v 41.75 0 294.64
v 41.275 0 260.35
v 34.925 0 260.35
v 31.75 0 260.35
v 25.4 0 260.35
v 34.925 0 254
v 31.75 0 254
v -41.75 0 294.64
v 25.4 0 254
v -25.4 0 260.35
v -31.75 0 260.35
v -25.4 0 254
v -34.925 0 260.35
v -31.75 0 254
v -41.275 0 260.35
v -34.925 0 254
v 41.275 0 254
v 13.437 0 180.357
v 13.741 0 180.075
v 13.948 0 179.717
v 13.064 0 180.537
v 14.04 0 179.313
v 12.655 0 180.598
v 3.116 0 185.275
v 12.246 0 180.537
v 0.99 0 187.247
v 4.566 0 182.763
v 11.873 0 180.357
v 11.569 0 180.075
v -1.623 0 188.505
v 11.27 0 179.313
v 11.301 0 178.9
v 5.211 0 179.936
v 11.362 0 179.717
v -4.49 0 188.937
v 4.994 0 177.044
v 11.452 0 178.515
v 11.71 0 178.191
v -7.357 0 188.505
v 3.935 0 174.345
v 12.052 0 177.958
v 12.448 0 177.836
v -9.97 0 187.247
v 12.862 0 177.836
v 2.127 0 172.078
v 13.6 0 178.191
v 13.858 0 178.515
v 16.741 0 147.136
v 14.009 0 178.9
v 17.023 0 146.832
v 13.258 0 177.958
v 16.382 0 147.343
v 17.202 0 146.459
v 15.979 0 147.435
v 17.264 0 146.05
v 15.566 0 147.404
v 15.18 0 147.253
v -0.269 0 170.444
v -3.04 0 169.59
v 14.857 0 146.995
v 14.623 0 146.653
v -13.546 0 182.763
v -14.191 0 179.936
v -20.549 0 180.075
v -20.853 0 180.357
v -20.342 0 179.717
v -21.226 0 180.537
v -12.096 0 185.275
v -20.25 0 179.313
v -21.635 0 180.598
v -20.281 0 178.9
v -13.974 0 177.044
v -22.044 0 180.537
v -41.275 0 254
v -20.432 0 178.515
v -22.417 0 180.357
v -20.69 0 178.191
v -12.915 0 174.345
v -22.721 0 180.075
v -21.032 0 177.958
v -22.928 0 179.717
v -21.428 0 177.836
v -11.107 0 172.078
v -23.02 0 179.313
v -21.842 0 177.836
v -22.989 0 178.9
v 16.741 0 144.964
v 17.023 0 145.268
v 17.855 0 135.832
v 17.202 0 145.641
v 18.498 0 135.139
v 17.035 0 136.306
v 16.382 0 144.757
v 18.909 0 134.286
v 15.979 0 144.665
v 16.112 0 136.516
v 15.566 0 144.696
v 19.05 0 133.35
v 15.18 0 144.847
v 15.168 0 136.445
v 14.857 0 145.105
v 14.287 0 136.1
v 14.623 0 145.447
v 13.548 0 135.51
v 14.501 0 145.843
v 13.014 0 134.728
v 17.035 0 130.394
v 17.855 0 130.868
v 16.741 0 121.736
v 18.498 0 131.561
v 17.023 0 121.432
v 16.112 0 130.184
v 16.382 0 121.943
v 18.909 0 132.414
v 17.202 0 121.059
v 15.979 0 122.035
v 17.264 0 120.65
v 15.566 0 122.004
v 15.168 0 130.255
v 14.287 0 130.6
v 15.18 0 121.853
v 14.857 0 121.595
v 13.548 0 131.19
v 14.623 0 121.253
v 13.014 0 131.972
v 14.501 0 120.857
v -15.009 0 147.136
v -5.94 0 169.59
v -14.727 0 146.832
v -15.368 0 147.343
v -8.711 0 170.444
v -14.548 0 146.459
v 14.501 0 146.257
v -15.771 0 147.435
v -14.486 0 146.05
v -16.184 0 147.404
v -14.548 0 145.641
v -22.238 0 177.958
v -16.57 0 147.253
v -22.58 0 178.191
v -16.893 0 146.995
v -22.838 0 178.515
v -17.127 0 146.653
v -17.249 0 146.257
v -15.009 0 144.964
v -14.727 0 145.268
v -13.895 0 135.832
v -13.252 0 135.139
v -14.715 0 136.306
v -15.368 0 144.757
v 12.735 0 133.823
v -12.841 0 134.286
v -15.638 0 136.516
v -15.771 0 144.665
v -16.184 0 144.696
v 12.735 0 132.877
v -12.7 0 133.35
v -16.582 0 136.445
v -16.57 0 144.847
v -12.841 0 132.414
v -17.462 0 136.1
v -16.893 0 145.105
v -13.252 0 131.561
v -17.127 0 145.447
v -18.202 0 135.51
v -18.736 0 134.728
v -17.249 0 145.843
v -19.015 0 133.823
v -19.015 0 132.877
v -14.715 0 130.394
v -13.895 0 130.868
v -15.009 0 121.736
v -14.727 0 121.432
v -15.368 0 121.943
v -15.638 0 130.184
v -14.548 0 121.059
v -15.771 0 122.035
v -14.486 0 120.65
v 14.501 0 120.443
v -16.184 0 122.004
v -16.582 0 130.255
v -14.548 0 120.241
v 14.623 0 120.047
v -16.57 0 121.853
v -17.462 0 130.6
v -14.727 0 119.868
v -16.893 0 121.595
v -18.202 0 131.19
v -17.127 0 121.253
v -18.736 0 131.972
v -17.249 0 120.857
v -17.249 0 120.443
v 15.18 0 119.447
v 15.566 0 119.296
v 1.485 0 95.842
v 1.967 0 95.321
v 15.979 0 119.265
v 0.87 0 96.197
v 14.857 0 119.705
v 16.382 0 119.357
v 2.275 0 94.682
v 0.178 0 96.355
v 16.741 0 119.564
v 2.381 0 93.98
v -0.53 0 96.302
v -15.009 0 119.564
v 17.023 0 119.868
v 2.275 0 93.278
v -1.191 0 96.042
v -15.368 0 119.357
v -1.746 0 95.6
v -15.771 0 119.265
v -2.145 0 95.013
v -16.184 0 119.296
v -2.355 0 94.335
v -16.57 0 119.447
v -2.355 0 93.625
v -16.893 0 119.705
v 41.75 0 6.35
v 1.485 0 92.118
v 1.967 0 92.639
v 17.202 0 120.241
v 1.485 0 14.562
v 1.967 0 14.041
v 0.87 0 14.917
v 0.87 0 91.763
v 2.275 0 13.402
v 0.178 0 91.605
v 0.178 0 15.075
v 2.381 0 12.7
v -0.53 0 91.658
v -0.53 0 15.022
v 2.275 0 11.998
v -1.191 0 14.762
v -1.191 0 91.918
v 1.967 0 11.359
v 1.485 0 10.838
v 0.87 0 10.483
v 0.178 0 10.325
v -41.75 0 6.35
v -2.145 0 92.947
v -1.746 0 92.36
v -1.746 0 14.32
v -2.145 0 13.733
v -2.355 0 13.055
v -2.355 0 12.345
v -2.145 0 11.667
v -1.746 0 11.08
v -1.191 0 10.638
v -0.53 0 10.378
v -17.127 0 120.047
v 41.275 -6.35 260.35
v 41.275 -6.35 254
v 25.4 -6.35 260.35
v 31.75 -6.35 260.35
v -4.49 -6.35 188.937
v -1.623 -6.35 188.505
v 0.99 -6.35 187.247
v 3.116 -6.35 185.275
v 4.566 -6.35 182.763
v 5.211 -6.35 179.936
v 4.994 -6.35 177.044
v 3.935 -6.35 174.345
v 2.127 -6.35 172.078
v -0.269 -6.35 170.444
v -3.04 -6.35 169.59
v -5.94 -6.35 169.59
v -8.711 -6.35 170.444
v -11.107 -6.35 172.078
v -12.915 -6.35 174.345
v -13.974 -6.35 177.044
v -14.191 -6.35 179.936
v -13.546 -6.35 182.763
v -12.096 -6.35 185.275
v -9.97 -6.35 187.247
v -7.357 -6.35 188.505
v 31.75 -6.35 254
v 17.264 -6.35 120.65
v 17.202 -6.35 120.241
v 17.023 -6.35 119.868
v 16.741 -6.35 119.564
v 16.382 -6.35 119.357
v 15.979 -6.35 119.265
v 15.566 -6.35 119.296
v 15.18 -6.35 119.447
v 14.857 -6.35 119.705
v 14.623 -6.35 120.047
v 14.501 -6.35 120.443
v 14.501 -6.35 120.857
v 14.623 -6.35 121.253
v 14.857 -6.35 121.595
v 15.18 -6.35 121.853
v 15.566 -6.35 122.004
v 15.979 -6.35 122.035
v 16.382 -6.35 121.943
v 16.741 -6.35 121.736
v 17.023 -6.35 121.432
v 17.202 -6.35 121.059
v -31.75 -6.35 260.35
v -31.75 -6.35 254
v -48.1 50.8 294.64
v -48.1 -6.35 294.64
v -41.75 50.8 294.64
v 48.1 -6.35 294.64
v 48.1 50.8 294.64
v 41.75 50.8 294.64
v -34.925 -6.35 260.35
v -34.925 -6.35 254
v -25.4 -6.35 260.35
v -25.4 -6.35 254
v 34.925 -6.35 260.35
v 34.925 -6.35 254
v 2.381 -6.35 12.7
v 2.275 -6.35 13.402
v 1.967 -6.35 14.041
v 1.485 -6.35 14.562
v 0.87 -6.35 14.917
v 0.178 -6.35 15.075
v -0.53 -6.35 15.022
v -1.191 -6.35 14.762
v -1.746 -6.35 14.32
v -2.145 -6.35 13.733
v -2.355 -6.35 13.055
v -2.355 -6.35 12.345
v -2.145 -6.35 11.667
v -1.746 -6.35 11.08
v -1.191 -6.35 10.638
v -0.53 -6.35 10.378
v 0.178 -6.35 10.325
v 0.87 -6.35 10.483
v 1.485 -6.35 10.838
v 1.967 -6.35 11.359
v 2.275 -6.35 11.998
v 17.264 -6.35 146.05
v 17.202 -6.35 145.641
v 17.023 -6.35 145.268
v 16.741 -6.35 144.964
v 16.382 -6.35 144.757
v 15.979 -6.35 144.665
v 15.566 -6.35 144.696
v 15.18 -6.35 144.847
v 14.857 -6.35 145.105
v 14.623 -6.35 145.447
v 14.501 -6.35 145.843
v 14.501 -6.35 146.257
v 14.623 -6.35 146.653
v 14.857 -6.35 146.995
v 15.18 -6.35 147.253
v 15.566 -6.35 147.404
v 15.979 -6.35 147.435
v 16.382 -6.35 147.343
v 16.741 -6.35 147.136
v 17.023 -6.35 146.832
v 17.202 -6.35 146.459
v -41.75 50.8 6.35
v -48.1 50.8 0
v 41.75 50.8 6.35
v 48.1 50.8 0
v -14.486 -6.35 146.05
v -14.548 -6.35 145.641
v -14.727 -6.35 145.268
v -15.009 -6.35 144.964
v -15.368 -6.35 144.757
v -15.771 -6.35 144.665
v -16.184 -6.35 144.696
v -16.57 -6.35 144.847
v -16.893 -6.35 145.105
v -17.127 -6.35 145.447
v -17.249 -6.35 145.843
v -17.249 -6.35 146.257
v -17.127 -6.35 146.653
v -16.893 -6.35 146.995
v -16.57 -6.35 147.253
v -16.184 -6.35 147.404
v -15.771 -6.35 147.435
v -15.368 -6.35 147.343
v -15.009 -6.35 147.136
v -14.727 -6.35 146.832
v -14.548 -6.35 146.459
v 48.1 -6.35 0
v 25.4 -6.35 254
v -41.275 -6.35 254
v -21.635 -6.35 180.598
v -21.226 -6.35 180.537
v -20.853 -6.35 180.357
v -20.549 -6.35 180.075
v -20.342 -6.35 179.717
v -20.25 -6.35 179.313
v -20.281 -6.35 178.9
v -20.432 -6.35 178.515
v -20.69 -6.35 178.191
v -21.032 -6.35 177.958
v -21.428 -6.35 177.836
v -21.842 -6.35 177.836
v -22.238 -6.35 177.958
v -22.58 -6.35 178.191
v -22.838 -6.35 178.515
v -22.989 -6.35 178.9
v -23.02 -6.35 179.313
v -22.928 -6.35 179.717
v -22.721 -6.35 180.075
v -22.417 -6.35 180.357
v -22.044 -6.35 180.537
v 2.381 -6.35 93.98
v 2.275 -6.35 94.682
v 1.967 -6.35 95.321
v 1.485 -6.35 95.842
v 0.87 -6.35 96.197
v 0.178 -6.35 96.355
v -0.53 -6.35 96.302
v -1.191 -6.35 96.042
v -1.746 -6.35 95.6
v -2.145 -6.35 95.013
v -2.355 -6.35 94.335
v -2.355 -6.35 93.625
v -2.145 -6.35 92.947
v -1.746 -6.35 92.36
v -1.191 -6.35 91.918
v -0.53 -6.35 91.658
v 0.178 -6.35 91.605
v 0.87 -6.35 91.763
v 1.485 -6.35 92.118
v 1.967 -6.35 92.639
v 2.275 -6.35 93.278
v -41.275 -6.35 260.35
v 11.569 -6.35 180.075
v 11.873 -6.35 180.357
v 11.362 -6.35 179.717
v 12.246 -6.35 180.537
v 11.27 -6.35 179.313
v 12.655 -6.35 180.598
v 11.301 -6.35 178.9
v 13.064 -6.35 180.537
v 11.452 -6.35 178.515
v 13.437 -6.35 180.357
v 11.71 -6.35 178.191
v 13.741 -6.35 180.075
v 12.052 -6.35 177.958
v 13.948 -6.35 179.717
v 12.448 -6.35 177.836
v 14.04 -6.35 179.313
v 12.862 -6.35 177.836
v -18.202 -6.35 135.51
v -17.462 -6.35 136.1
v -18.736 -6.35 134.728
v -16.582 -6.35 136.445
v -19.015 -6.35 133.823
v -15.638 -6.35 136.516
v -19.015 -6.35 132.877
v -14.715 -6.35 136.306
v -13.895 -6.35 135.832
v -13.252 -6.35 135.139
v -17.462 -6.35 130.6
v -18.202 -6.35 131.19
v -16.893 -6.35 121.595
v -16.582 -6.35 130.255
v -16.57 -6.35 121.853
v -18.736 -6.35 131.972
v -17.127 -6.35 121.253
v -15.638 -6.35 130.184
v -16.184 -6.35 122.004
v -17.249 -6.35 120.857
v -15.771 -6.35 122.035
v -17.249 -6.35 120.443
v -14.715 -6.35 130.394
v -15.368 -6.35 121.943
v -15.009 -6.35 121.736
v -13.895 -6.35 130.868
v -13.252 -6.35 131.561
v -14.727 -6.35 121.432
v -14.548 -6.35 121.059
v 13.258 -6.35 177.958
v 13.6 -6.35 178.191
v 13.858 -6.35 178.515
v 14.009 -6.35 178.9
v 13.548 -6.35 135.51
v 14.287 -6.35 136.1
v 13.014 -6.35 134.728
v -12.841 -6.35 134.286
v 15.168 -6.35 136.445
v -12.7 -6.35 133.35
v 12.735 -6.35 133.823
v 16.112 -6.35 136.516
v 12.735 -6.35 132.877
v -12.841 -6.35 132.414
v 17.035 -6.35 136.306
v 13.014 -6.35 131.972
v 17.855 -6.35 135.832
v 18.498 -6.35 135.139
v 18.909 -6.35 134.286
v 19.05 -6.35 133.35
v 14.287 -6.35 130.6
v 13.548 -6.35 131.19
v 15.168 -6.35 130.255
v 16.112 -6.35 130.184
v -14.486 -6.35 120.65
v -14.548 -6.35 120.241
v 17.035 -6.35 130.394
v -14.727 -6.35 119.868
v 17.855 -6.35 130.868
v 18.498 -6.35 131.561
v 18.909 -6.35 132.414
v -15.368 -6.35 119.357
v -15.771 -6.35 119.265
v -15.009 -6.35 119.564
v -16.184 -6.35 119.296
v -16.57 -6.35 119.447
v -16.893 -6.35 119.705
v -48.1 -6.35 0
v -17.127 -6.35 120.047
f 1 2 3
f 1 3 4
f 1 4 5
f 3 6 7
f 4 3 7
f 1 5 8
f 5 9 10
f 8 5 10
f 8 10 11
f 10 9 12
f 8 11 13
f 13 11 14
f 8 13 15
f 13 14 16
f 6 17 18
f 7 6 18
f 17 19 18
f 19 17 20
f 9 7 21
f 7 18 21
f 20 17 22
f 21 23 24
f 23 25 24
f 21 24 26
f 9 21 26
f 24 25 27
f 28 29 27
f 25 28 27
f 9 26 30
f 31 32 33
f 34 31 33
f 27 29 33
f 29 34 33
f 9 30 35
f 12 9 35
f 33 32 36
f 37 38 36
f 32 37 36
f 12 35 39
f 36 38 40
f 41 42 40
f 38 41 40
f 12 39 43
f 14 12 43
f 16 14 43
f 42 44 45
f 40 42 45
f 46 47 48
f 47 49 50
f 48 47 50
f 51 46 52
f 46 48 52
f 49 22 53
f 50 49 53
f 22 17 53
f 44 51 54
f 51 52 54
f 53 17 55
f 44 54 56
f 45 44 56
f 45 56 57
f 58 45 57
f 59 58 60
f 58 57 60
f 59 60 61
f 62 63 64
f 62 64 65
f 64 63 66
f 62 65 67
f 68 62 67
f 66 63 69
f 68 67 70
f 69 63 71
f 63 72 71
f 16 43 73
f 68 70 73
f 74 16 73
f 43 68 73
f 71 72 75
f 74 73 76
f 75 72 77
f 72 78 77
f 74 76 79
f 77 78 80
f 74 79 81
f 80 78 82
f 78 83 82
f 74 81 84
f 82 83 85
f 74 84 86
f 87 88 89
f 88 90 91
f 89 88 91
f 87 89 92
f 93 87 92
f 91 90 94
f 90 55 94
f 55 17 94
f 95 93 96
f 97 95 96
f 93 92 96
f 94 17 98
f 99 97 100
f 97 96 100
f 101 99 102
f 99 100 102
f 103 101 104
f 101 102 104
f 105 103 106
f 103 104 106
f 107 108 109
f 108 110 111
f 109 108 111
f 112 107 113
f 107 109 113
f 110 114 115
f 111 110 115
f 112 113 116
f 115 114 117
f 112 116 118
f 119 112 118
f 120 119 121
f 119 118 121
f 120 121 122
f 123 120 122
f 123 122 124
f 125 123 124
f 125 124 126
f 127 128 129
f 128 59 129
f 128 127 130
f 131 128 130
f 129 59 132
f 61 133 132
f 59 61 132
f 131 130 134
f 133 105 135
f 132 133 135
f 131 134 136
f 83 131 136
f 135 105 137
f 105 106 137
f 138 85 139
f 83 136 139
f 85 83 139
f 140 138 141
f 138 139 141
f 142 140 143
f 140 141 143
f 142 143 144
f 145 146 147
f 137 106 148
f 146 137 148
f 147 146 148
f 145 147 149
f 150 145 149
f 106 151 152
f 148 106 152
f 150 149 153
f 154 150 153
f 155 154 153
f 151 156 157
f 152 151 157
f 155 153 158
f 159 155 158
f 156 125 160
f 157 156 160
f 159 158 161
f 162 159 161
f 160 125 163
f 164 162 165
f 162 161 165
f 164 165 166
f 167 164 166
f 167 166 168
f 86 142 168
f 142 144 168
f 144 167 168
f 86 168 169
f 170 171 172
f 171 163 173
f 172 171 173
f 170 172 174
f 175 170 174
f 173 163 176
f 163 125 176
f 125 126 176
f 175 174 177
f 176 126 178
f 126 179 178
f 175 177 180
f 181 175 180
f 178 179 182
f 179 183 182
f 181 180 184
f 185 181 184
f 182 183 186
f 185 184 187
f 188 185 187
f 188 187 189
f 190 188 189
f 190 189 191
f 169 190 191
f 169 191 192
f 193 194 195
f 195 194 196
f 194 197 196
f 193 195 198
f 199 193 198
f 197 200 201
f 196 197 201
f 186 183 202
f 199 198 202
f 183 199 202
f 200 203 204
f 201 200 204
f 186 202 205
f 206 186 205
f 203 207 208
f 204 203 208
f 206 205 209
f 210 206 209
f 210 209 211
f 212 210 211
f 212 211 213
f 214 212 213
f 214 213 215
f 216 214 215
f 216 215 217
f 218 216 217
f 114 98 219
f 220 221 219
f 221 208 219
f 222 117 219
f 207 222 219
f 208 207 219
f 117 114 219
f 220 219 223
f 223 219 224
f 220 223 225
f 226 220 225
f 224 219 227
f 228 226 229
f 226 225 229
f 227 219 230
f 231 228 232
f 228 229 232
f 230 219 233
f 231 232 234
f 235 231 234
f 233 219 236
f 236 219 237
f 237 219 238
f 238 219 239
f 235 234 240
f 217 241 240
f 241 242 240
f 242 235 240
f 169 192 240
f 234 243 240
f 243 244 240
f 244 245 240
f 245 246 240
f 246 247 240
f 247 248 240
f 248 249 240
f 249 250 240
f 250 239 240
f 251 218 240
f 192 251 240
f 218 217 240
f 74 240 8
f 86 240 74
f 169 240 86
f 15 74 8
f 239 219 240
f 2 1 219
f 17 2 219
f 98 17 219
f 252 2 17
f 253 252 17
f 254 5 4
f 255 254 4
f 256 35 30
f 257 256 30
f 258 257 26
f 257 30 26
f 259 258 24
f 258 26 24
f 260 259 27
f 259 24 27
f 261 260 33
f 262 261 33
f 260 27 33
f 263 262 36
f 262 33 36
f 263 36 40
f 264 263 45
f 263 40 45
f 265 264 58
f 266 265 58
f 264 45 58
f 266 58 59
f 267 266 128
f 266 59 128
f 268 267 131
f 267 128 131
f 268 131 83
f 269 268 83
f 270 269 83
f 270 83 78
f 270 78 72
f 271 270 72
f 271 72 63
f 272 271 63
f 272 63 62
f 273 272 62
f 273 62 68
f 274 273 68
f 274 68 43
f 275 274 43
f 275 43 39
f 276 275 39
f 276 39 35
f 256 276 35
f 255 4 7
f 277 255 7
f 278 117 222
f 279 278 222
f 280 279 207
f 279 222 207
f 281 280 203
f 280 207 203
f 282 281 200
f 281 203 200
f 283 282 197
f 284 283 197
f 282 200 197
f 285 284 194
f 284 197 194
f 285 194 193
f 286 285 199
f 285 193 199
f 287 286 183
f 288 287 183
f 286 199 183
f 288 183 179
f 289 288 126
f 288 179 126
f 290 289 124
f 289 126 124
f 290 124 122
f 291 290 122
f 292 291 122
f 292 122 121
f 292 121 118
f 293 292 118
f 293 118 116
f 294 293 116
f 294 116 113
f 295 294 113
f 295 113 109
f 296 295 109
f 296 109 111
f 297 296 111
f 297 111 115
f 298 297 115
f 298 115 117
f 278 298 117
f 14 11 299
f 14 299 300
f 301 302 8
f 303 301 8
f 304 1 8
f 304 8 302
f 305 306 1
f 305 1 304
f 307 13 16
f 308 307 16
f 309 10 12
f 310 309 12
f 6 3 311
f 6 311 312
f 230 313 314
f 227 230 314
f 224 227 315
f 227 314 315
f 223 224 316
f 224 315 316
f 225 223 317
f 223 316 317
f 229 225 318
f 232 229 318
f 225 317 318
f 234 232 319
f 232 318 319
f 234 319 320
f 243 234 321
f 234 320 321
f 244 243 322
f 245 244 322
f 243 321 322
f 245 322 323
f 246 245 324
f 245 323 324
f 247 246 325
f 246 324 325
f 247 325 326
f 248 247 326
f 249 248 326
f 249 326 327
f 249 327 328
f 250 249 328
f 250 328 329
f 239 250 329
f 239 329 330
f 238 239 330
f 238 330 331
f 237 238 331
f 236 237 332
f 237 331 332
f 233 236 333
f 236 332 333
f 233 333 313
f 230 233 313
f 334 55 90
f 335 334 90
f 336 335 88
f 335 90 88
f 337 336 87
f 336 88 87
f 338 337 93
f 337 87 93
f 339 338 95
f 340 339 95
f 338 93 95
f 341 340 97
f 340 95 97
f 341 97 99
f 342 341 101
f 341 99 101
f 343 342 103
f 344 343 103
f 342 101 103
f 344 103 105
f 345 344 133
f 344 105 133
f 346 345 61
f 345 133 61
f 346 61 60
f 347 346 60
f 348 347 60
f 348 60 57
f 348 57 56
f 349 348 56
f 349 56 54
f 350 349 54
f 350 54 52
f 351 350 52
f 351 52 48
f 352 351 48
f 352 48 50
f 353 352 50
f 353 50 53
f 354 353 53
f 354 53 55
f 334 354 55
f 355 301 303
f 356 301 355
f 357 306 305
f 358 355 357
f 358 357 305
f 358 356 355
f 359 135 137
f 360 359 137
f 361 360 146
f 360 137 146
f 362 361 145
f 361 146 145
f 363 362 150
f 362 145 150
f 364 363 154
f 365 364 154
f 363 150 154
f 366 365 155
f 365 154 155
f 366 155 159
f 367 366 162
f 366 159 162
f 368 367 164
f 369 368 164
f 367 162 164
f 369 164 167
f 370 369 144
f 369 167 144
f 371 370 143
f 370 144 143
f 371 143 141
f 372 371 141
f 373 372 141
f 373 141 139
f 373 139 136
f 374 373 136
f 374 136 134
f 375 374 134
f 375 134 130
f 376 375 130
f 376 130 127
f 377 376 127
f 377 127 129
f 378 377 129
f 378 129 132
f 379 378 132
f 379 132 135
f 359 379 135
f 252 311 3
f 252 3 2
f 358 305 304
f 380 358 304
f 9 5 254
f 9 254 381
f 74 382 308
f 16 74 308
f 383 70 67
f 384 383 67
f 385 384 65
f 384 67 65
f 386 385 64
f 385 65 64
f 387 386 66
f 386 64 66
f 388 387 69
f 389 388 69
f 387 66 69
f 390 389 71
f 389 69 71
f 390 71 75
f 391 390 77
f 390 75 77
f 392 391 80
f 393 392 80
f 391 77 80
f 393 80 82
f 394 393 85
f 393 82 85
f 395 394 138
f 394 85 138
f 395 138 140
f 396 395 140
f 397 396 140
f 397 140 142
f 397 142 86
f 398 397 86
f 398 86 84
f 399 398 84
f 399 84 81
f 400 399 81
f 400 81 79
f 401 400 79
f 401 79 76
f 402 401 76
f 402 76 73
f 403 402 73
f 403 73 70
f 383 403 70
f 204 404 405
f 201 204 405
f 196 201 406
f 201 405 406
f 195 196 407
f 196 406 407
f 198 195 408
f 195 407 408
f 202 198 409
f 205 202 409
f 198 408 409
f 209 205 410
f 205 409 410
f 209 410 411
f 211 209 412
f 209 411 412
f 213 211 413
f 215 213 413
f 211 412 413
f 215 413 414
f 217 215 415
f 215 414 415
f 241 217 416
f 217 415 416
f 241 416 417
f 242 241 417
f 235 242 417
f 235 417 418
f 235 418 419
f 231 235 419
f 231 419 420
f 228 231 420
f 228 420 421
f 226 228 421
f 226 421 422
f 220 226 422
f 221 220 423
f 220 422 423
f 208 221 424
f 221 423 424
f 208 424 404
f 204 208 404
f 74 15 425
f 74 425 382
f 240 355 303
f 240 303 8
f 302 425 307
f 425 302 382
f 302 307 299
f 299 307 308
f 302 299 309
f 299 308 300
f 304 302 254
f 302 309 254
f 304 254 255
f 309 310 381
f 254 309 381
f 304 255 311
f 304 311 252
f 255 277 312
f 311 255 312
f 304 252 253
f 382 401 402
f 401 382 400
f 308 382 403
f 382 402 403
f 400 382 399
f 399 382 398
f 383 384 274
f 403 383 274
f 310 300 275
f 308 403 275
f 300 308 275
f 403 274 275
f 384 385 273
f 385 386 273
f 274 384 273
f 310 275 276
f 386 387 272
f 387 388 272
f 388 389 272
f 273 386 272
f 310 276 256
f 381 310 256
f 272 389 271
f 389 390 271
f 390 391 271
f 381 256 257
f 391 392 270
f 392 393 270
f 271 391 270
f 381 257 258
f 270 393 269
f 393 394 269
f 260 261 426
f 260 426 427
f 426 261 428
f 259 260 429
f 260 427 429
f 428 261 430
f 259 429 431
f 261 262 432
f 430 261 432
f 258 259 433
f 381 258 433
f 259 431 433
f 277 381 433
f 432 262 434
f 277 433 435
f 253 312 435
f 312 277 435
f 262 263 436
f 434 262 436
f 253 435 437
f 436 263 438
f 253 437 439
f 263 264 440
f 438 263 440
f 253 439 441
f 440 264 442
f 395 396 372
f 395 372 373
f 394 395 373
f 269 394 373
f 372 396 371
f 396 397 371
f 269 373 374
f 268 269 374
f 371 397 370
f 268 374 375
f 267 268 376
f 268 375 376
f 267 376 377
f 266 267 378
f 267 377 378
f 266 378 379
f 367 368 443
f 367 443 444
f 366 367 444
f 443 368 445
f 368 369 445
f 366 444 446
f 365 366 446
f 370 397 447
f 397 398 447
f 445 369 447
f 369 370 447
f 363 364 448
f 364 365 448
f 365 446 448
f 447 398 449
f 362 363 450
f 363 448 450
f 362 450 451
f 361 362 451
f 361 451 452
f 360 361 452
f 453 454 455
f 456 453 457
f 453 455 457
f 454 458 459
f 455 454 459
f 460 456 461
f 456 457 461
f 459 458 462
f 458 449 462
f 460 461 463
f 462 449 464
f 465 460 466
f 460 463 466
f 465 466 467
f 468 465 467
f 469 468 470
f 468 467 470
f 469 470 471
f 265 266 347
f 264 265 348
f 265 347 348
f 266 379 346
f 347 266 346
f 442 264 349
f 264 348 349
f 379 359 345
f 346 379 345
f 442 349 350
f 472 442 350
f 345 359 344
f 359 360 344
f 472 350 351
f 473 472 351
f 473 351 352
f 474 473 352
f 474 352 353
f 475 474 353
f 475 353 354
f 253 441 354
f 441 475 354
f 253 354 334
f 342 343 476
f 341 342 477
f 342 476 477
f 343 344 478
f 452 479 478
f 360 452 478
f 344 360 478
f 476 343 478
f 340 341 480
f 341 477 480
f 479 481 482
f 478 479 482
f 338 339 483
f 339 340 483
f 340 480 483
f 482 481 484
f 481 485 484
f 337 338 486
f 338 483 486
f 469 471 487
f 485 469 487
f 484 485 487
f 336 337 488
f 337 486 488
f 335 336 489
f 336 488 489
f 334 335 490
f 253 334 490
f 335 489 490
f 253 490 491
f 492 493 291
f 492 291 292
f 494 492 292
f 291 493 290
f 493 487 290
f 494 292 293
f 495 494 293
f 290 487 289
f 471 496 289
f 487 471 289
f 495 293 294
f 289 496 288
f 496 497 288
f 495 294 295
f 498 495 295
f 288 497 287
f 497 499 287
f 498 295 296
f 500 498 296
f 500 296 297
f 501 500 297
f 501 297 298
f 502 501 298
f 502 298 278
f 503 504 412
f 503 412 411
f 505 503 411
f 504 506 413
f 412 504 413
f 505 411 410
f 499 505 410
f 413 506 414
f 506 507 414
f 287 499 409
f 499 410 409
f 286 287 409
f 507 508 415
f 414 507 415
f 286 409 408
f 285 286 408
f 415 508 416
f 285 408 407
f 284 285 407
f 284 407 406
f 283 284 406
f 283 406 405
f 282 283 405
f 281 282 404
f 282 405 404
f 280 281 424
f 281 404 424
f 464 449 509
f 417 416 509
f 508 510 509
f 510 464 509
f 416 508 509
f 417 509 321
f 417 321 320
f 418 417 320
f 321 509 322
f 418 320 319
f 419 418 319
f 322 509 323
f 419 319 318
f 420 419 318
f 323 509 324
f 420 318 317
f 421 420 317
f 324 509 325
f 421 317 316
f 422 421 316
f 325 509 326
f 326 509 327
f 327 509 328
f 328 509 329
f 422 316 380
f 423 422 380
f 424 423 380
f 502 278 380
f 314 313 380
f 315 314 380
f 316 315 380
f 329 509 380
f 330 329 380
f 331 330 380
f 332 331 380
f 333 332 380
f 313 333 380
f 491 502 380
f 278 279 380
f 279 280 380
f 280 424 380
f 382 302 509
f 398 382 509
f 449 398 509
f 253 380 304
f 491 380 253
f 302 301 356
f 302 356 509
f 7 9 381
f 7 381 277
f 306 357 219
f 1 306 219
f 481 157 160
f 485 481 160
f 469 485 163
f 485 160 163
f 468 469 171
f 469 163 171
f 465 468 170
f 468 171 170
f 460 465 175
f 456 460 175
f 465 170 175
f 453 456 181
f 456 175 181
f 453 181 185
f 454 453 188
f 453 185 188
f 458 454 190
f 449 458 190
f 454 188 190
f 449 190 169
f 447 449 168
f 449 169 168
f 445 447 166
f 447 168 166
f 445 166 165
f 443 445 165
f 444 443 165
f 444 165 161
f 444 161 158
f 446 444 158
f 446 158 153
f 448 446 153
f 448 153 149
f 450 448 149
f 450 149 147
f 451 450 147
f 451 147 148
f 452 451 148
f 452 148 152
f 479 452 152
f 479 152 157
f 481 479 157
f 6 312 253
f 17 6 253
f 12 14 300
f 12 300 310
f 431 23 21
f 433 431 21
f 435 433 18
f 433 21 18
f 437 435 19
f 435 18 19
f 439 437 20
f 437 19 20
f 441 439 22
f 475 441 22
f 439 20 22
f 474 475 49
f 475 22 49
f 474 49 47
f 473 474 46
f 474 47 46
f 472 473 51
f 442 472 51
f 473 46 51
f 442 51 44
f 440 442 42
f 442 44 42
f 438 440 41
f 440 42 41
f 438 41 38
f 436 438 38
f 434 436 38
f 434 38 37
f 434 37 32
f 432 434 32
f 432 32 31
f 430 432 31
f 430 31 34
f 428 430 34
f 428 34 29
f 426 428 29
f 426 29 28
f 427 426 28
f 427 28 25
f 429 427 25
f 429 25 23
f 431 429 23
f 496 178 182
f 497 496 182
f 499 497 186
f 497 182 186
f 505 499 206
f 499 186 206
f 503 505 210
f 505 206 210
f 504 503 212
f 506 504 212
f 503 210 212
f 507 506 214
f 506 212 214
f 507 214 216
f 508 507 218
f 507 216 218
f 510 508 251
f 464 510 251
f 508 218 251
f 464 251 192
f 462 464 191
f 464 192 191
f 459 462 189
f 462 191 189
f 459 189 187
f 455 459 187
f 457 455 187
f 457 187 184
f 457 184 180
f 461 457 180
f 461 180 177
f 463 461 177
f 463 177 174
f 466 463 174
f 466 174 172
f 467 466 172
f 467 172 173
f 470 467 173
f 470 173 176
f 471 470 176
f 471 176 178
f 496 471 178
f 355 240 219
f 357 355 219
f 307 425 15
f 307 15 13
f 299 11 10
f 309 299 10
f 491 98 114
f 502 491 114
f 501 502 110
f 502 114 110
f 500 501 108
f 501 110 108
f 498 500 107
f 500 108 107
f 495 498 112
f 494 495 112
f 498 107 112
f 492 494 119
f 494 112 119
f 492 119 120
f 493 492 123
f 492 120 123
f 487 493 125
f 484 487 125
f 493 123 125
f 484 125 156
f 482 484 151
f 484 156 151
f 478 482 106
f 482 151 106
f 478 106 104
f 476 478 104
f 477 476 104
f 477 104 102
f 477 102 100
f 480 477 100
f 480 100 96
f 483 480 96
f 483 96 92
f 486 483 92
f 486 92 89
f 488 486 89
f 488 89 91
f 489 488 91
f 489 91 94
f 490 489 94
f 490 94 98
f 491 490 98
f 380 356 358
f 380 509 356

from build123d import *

# Parameters (mm, degrees)
BOSS_EXTRUDE1_DEPTH            = 294.64
SKETCH2_W                      = 83.5
SKETCH2_H                      = 6.35
BOSS_EXTRUDE2_DEPTH            = 50.8
SKETCH3_R                      = 2.38125
CUT_EXTRUDE1_DEPTH             = 6.35
CUT_EXTRUDE2_REACH             = 304.832
SKETCH4_R                      = 9.7282
SKETCH4_R_2                    = 1.3890625
CUT_EXTRUDE3_REACH             = 304.832
SKETCH5_R                      = 3.175
SKETCH5_R_2                    = 1.3890625
CUT_EXTRUDE3_DIRECTION_2_DEPTH = 303.83160271
SKETCH6_W                      = 6.35
SKETCH6_H                      = 6.35
CUT_EXTRUDE4_DEPTH             = 6.35


with BuildPart() as part:
    # Sketch1 → Boss-Extrude1 (new body)
    with BuildSketch(Plane.XY):
        Polygon((0, 0), (41.75, 0), (41.75, 22.225), (41.75, 50.8), (48.1, 50.8), (48.1, -6.35), (0, -6.35), align=None)
    extrude(amount=BOSS_EXTRUDE1_DEPTH)

    # Mirror1: part across plane


with BuildPart() as part_1:
    add(part.part)
    add(part.part.mirror(Plane(origin=(0, -6.35, 294.64), x_dir=(0, 0, 1), z_dir=(-1, 0, 0))))

    # Sketch2 → Boss-Extrude2 (add)
    with BuildSketch(Plane(origin=(0, 0, 0), x_dir=(1, 0, 0), z_dir=(0, 1, 0))):
        with Locations((0, -3.175)):
            Rectangle(SKETCH2_W, SKETCH2_H)
    extrude(amount=BOSS_EXTRUDE2_DEPTH)

    # Sketch3 → Cut-Extrude1 (cut)
    with BuildSketch(Plane.XZ.offset(6.35)):
        with Locations((0, 12.7)):
            Circle(SKETCH3_R)
        with Locations((0, 93.98)):
            Circle(SKETCH3_R)
    extrude(amount=-CUT_EXTRUDE1_DEPTH, mode=Mode.SUBTRACT)

    # Sketch4 → Cut-Extrude2 (cut, up to next)
    with BuildSketch(Plane(origin=(0, 0, 0), x_dir=(1, 0, 0), z_dir=(0, 1, 0)), mode=Mode.PRIVATE) as cut_extrude2_sk1:
        with Locations(Location((-4.490010202, -179.209178053, 0), (0, 0, 270))):
            Circle(SKETCH4_R)
    cut_extrude2_tool1 = extrude(cut_extrude2_sk1.sketch, amount=-CUT_EXTRUDE2_REACH, mode=Mode.PRIVATE) & part_1.part
    # Sketch4 → Cut-Extrude2 (cut, up to next)
    with BuildSketch(Plane(origin=(0, 0, 0), x_dir=(1, 0, 0), z_dir=(0, 1, 0)), mode=Mode.PRIVATE) as cut_extrude2_sk2:
        with Locations(Location((-21.635010202, -179.209178053, 0), (0, 0, 270))):
            Circle(SKETCH4_R_2)
    cut_extrude2_tool2 = extrude(cut_extrude2_sk2.sketch, amount=-CUT_EXTRUDE2_REACH, mode=Mode.PRIVATE) & part_1.part
    # Sketch4 → Cut-Extrude2 (cut, up to next)
    with BuildSketch(Plane(origin=(0, 0, 0), x_dir=(1, 0, 0), z_dir=(0, 1, 0)), mode=Mode.PRIVATE) as cut_extrude2_sk3:
        with Locations(Location((12.654989798, -179.209178053, 0), (0, 0, 270))):
            Circle(SKETCH4_R_2)
    cut_extrude2_tool3 = extrude(cut_extrude2_sk3.sketch, amount=-CUT_EXTRUDE2_REACH, mode=Mode.PRIVATE) & part_1.part
    add(cut_extrude2_tool1.solids().sort_by_distance((-4.49001, 0, 179.209178))[0], mode=Mode.SUBTRACT)
    add(cut_extrude2_tool2.solids().sort_by_distance((-21.63501, 0, 179.209178))[0], mode=Mode.SUBTRACT)
    add(cut_extrude2_tool3.solids().sort_by_distance((12.65499, 0, 179.209178))[0], mode=Mode.SUBTRACT)

    # Sketch5 → Cut-Extrude3 (cut, up to next)
    with BuildSketch(Plane(origin=(0, 0, 0), x_dir=(1, 0, 0), z_dir=(0, 1, 0)), mode=Mode.PRIVATE) as cut_extrude3_sk1:
        with Locations((15.8749986, -133.35)):
            Circle(SKETCH5_R)
    cut_extrude3_tool1 = extrude(cut_extrude3_sk1.sketch, amount=-CUT_EXTRUDE3_REACH, mode=Mode.PRIVATE) & part_1.part
    # Sketch5 → Cut-Extrude3 (cut, up to next)
    with BuildSketch(Plane(origin=(0, 0, 0), x_dir=(1, 0, 0), z_dir=(0, 1, 0)), mode=Mode.PRIVATE) as cut_extrude3_sk2:
        with Locations((-15.8749986, -133.35)):
            Circle(SKETCH5_R)
    cut_extrude3_tool2 = extrude(cut_extrude3_sk2.sketch, amount=-CUT_EXTRUDE3_REACH, mode=Mode.PRIVATE) & part_1.part
    # Sketch5 → Cut-Extrude3 (cut, up to next)
    with BuildSketch(Plane(origin=(0, 0, 0), x_dir=(1, 0, 0), z_dir=(0, 1, 0)), mode=Mode.PRIVATE) as cut_extrude3_sk3:
        with Locations((15.8749986, -146.05)):
            Circle(SKETCH5_R_2)
    cut_extrude3_tool3 = extrude(cut_extrude3_sk3.sketch, amount=-CUT_EXTRUDE3_REACH, mode=Mode.PRIVATE) & part_1.part
    # Sketch5 → Cut-Extrude3 (cut, up to next)
    with BuildSketch(Plane(origin=(0, 0, 0), x_dir=(1, 0, 0), z_dir=(0, 1, 0)), mode=Mode.PRIVATE) as cut_extrude3_sk4:
        with Locations((15.8749986, -120.65)):
            Circle(SKETCH5_R_2)
    cut_extrude3_tool4 = extrude(cut_extrude3_sk4.sketch, amount=-CUT_EXTRUDE3_REACH, mode=Mode.PRIVATE) & part_1.part
    # Sketch5 → Cut-Extrude3 (cut, up to next)
    with BuildSketch(Plane(origin=(0, 0, 0), x_dir=(1, 0, 0), z_dir=(0, 1, 0)), mode=Mode.PRIVATE) as cut_extrude3_sk5:
        with Locations((-15.8749986, -146.05)):
            Circle(SKETCH5_R_2)
    cut_extrude3_tool5 = extrude(cut_extrude3_sk5.sketch, amount=-CUT_EXTRUDE3_REACH, mode=Mode.PRIVATE) & part_1.part
    # Sketch5 → Cut-Extrude3 (cut, up to next)
    with BuildSketch(Plane(origin=(0, 0, 0), x_dir=(1, 0, 0), z_dir=(0, 1, 0)), mode=Mode.PRIVATE) as cut_extrude3_sk6:
        with Locations((-15.8749986, -120.65)):
            Circle(SKETCH5_R_2)
    cut_extrude3_tool6 = extrude(cut_extrude3_sk6.sketch, amount=-CUT_EXTRUDE3_REACH, mode=Mode.PRIVATE) & part_1.part
    add(cut_extrude3_tool1.solids().sort_by_distance((15.874999, 0, 133.35))[0], mode=Mode.SUBTRACT)
    add(cut_extrude3_tool2.solids().sort_by_distance((-15.874999, 0, 133.35))[0], mode=Mode.SUBTRACT)
    add(cut_extrude3_tool3.solids().sort_by_distance((15.874999, 0, 146.05))[0], mode=Mode.SUBTRACT)
    add(cut_extrude3_tool4.solids().sort_by_distance((15.874999, 0, 120.65))[0], mode=Mode.SUBTRACT)
    add(cut_extrude3_tool5.solids().sort_by_distance((-15.874999, 0, 146.05))[0], mode=Mode.SUBTRACT)
    add(cut_extrude3_tool6.solids().sort_by_distance((-15.874999, 0, 120.65))[0], mode=Mode.SUBTRACT)

    # Sketch5 → Cut-Extrude3 direction 2 (cut)
    with BuildSketch(Plane(origin=(0, 0, 0), x_dir=(1, 0, 0), z_dir=(0, 1, 0))):
        with Locations((15.8749986, -133.35)):
            Circle(SKETCH5_R)
        with Locations((-15.8749986, -133.35)):
            Circle(SKETCH5_R)
        with Locations((15.8749986, -146.05)):
            Circle(SKETCH5_R_2)
        with Locations((15.8749986, -120.65)):
            Circle(SKETCH5_R_2)
        with Locations((-15.8749986, -146.05)):
            Circle(SKETCH5_R_2)
        with Locations((-15.8749986, -120.65)):
            Circle(SKETCH5_R_2)
    extrude(amount=CUT_EXTRUDE3_DIRECTION_2_DEPTH, mode=Mode.SUBTRACT)

    # Sketch6 → Cut-Extrude4 (cut)
    with BuildSketch(Plane(origin=(0, 0, 0), x_dir=(1, 0, 0), z_dir=(0, 1, 0))):
        with Locations((28.575, -257.175)):
            Rectangle(SKETCH6_W, SKETCH6_H)
        with Locations((-28.575, -257.175)):
            Rectangle(SKETCH6_W, SKETCH6_H)
        with Locations((38.1, -257.175)):
            Rectangle(SKETCH6_W, SKETCH6_H)
        with Locations((-38.1, -257.175)):
            Rectangle(SKETCH6_W, SKETCH6_H)
    extrude(amount=-CUT_EXTRUDE4_DEPTH, mode=Mode.SUBTRACT)


solid = part_1.part
